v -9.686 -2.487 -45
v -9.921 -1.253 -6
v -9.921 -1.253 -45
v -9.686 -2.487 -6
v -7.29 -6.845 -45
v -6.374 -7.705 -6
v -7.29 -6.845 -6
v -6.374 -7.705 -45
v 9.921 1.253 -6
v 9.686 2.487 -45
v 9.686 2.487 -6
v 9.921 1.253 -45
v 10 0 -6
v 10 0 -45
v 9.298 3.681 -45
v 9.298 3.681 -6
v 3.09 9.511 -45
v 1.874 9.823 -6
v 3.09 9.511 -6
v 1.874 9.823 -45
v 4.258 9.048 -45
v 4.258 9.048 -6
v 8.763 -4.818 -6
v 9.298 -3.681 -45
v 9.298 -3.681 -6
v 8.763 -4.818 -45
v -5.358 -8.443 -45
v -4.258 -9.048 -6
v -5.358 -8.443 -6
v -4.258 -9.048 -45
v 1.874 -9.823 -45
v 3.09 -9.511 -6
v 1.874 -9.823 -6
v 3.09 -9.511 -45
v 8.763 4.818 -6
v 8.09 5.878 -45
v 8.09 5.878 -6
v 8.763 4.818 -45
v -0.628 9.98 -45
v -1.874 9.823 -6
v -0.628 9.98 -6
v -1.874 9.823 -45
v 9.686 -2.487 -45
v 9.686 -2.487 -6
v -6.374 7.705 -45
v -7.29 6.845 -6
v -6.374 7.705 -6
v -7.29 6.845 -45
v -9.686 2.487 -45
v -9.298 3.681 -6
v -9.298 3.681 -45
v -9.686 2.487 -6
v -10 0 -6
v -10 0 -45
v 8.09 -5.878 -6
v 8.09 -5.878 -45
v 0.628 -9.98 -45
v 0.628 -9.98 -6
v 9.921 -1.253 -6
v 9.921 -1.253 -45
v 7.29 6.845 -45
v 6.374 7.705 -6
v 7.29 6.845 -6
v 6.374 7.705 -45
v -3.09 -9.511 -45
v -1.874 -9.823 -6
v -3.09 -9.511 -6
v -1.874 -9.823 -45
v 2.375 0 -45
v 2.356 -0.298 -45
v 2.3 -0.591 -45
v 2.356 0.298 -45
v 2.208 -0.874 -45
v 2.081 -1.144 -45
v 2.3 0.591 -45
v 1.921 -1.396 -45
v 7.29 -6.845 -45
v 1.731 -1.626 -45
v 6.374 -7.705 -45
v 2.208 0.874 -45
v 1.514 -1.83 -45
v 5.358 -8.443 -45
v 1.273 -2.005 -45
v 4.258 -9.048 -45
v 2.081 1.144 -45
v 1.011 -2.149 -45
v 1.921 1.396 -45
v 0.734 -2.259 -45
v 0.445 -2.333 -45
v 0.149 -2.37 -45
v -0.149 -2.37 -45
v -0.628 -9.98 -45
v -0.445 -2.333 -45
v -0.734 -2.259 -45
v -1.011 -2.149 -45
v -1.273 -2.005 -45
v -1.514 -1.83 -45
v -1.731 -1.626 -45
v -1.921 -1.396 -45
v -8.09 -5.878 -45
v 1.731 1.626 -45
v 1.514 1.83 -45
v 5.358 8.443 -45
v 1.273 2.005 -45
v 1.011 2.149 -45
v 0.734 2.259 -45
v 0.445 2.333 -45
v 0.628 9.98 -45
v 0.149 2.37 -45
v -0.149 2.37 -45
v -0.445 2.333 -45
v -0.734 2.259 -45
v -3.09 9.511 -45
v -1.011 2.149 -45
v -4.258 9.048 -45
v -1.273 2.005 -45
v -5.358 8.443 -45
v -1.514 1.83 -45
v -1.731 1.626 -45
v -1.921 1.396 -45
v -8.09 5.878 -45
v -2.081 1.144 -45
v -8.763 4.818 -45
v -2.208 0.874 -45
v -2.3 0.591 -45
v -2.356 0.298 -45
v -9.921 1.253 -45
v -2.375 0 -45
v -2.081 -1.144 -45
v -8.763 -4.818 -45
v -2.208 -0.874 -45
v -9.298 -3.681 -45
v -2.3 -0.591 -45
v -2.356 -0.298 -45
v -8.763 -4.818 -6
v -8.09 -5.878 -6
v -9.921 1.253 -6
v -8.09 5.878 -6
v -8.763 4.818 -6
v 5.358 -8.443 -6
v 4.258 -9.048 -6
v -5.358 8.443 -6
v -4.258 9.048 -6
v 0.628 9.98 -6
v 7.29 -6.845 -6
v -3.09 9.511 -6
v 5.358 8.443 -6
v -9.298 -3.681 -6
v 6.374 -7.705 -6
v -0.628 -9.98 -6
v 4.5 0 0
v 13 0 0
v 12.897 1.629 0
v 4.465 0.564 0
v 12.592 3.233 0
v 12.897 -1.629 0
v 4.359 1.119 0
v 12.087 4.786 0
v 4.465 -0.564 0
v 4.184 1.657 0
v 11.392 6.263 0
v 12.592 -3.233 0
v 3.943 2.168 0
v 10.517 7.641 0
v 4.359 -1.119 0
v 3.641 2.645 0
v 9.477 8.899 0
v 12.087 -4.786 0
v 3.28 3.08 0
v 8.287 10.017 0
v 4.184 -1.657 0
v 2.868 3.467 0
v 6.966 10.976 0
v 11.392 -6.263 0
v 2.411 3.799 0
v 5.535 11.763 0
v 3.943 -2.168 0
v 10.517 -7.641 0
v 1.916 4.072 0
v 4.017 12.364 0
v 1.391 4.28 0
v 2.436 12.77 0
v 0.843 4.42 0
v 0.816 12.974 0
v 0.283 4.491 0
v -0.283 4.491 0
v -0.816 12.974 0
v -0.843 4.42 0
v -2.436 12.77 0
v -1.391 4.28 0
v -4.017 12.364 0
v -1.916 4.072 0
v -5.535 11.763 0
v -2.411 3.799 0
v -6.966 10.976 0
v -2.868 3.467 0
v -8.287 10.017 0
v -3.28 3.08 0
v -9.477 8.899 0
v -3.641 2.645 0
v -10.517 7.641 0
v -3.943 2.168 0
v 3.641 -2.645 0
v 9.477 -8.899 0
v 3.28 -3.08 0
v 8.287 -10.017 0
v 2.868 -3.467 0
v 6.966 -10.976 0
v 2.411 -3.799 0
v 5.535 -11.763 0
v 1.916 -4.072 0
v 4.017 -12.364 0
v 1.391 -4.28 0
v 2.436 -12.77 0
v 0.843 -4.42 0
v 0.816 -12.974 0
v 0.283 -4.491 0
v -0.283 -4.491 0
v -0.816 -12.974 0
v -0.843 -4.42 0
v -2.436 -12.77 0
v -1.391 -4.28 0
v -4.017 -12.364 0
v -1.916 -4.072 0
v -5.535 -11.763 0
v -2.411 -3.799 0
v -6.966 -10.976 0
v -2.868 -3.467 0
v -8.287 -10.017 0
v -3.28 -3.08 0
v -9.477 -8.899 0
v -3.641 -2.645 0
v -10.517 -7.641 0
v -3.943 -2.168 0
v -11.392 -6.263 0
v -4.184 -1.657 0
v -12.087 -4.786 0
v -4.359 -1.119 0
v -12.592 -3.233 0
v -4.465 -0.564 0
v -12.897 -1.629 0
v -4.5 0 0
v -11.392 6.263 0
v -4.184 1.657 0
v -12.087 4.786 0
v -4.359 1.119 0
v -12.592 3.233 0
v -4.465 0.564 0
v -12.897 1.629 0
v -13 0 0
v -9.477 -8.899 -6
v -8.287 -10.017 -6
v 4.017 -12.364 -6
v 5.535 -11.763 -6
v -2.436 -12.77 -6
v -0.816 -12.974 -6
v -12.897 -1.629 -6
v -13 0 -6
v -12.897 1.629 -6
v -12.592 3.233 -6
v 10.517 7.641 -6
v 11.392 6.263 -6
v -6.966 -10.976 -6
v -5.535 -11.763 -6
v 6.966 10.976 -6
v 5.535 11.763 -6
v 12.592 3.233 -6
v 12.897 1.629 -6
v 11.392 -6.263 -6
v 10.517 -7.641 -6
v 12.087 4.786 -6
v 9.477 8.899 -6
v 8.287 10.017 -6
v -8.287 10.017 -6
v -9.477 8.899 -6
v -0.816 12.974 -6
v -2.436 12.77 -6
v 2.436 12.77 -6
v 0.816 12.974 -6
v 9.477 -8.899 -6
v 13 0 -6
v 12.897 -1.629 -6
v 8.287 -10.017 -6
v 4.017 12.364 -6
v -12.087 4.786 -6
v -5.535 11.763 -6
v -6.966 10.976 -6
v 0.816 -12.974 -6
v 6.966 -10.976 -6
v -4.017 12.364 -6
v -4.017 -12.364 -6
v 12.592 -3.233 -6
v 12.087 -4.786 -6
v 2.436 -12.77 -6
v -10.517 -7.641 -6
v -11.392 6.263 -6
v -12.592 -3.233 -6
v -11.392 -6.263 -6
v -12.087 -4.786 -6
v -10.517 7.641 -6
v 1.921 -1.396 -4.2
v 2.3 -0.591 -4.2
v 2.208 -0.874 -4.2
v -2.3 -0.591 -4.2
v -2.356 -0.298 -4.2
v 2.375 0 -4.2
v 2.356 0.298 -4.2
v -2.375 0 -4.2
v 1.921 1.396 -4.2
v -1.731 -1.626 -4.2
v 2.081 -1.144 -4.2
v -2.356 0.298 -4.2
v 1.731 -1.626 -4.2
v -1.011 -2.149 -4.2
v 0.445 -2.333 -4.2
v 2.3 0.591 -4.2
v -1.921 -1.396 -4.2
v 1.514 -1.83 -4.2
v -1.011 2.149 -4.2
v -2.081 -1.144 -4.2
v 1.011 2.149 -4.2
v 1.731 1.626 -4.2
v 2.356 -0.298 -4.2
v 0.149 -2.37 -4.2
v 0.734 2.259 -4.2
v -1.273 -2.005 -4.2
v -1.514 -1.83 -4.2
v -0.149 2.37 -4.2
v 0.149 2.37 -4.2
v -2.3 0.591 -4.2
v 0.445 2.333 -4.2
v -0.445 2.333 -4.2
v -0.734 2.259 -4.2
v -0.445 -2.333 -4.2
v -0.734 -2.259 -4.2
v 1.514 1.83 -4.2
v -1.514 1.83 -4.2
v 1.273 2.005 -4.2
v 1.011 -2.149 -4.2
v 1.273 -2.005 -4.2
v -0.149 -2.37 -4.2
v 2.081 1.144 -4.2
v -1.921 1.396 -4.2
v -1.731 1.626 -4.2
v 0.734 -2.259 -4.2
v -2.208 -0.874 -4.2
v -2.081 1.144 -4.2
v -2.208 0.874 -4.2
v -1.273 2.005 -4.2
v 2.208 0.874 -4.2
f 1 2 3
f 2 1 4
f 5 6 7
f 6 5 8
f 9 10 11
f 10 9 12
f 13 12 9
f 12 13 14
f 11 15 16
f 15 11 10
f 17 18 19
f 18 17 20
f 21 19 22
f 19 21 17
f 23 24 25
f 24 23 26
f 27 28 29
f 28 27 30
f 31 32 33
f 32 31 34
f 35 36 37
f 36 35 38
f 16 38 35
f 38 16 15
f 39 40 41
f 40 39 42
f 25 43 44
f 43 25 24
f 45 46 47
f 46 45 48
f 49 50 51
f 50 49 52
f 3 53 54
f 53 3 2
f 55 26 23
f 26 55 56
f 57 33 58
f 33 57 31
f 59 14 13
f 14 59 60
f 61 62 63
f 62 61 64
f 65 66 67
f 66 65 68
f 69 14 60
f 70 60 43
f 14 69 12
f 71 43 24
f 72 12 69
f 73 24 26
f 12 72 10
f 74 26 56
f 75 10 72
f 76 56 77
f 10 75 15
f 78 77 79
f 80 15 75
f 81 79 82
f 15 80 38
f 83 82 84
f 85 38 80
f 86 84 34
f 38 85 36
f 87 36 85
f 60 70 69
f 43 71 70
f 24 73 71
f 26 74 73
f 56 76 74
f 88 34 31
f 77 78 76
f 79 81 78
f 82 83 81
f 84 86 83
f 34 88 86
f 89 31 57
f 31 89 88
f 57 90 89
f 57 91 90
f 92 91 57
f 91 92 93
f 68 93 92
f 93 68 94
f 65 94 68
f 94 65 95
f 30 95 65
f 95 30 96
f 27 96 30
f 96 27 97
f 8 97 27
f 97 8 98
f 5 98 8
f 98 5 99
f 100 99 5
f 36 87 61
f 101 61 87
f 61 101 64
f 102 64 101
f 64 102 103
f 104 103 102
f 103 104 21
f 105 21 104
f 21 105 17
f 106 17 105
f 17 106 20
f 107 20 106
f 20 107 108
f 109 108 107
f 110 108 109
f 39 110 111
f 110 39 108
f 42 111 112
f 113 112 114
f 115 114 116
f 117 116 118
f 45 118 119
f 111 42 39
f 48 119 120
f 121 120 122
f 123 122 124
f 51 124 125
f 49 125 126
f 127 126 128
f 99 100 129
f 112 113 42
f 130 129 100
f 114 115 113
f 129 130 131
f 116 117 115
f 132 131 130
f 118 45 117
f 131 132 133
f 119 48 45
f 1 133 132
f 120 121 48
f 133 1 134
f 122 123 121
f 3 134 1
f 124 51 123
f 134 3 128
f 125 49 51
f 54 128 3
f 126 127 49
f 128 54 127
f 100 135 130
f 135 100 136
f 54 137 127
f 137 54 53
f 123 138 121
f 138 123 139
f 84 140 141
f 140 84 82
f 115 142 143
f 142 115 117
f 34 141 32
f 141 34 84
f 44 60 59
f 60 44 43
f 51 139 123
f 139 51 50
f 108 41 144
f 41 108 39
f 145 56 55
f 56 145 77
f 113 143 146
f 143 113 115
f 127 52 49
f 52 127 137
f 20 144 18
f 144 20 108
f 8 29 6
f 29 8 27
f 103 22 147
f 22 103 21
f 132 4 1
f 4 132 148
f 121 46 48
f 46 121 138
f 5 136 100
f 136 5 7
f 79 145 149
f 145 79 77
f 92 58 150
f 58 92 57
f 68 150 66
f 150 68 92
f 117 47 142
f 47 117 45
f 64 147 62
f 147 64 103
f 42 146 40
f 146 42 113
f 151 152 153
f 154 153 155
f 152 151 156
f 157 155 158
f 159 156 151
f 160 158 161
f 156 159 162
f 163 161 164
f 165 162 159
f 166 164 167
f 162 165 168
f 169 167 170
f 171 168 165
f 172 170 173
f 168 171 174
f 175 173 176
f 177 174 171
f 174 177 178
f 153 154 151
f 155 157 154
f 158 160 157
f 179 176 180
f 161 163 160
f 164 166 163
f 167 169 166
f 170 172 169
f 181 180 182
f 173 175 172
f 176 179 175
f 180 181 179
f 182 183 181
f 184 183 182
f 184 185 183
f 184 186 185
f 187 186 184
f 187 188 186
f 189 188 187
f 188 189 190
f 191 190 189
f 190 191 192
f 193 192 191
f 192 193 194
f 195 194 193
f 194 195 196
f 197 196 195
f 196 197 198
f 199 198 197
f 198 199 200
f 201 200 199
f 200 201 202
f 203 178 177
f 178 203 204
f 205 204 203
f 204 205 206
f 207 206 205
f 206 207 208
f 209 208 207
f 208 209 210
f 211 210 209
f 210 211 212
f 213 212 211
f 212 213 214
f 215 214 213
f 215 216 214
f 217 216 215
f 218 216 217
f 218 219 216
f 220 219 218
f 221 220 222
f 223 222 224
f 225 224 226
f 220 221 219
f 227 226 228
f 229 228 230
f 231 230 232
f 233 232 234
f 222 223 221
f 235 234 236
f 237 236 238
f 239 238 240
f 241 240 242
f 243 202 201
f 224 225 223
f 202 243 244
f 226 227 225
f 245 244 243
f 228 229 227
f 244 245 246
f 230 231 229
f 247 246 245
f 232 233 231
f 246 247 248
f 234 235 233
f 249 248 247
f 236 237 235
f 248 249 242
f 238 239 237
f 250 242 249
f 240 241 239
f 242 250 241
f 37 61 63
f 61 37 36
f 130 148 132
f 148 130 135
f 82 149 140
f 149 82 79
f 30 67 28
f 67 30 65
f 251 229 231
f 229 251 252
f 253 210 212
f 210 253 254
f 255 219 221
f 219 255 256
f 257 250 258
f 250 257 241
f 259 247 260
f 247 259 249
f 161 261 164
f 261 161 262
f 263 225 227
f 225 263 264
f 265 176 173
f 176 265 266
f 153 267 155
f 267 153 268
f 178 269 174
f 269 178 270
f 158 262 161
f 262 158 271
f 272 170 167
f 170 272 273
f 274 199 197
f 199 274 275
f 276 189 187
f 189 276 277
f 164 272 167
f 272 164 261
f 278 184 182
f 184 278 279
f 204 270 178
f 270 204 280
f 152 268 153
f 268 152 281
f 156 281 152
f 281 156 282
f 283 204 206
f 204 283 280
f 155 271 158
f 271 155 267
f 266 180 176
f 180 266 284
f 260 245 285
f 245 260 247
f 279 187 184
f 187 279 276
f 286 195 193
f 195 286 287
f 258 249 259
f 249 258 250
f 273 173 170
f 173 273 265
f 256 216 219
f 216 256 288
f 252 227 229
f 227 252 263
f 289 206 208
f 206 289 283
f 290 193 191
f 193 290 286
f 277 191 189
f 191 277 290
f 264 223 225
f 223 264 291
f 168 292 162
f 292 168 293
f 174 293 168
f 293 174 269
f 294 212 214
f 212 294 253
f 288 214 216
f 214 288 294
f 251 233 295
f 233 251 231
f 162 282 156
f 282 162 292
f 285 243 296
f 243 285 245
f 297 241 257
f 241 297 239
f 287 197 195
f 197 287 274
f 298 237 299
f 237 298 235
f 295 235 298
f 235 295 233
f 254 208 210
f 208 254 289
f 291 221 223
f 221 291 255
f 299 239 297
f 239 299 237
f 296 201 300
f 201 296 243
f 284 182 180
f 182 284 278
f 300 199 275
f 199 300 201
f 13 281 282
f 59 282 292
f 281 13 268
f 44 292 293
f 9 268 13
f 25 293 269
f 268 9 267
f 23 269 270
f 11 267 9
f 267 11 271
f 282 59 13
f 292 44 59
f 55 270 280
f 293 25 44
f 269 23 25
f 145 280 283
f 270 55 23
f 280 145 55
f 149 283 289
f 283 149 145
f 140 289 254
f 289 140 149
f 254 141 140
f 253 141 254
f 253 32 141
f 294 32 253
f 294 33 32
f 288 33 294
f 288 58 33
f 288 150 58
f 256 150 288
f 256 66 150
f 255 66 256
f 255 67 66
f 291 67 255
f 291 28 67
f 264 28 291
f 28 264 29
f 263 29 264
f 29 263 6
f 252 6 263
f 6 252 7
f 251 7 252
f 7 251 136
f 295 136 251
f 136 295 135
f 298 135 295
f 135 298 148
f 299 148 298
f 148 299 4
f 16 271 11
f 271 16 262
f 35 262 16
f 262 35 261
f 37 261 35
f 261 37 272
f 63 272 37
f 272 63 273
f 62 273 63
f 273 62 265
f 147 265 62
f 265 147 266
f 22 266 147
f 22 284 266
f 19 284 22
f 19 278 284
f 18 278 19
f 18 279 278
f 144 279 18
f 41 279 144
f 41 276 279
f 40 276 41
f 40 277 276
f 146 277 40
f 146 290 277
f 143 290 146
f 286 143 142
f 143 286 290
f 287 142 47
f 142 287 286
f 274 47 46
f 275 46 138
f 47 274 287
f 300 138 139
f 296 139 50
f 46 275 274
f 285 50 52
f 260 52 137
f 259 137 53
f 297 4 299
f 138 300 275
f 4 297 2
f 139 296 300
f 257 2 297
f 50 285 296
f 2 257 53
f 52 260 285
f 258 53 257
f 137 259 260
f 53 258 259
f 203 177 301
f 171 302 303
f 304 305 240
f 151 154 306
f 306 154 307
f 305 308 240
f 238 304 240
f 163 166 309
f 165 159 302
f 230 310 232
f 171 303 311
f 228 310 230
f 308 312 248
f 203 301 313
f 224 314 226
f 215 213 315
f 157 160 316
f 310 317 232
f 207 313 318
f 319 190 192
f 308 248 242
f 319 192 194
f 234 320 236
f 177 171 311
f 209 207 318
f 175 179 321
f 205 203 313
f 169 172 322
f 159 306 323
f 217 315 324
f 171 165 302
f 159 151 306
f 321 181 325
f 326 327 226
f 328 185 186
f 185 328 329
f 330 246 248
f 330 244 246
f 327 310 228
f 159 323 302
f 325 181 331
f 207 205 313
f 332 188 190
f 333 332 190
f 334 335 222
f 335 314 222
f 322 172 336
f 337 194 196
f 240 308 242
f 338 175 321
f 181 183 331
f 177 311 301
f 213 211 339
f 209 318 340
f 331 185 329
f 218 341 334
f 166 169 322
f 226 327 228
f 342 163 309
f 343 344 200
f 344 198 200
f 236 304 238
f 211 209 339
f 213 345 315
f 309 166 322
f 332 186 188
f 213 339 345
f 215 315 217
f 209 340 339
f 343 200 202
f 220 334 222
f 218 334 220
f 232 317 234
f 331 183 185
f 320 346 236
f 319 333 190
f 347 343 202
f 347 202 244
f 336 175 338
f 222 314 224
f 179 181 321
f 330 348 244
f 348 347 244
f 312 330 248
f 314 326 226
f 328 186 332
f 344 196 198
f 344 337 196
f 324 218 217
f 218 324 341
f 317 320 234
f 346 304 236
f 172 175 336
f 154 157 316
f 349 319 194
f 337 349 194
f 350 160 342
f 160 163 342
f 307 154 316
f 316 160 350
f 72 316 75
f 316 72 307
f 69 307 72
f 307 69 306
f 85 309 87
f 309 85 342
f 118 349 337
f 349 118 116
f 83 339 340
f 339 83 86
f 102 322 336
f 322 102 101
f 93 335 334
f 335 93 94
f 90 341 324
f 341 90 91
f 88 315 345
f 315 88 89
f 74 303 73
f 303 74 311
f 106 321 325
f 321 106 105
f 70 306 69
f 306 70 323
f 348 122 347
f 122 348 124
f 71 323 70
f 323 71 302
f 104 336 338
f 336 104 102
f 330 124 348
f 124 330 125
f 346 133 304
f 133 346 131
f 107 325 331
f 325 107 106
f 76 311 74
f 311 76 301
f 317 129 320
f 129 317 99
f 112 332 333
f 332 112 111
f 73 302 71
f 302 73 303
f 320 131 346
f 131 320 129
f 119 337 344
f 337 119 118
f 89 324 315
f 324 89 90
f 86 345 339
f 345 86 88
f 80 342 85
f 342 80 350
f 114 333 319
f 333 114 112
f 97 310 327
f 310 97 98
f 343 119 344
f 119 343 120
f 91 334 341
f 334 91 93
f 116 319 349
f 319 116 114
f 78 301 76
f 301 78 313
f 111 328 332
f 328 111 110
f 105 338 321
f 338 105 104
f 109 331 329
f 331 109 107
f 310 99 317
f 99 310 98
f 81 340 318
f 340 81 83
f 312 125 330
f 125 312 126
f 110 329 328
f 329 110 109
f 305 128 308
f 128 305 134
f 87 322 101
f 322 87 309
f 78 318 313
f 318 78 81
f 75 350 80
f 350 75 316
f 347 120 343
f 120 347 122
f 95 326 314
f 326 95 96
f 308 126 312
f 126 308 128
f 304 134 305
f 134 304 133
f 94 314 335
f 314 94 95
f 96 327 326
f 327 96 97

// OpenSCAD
$fn = 50;


difference() {
	union() {
		translate(v = [0, 0, -45.0000000000]) {
			cylinder(h = 45, r = 10.0000000000);
		}
		translate(v = [0, 0, -6.0000000000]) {
			cylinder(h = 6, r = 13.0000000000);
		}
	}
	union() {
		translate(v = [0, 0, 0]) {
			rotate(a = [0, 0, 0]) {
				difference() {
					union() {
						#translate(v = [0, 0, -45.0000000000]) {
							cylinder(h = 45, r = 2.2500000000);
						}
						#translate(v = [0, 0, -4.2000000000]) {
							cylinder(h = 4.2000000000, r1 = 2.3750000000, r2 = 4.5000000000);
						}
						#translate(v = [0, 0, -45.0000000000]) {
							cylinder(h = 45, r = 2.3750000000);
						}
						#translate(v = [0, 0, -45.0000000000]) {
							cylinder(h = 45, r = 2.2500000000);
						}
					}
					union();
				}
			}
		}
	}
}
